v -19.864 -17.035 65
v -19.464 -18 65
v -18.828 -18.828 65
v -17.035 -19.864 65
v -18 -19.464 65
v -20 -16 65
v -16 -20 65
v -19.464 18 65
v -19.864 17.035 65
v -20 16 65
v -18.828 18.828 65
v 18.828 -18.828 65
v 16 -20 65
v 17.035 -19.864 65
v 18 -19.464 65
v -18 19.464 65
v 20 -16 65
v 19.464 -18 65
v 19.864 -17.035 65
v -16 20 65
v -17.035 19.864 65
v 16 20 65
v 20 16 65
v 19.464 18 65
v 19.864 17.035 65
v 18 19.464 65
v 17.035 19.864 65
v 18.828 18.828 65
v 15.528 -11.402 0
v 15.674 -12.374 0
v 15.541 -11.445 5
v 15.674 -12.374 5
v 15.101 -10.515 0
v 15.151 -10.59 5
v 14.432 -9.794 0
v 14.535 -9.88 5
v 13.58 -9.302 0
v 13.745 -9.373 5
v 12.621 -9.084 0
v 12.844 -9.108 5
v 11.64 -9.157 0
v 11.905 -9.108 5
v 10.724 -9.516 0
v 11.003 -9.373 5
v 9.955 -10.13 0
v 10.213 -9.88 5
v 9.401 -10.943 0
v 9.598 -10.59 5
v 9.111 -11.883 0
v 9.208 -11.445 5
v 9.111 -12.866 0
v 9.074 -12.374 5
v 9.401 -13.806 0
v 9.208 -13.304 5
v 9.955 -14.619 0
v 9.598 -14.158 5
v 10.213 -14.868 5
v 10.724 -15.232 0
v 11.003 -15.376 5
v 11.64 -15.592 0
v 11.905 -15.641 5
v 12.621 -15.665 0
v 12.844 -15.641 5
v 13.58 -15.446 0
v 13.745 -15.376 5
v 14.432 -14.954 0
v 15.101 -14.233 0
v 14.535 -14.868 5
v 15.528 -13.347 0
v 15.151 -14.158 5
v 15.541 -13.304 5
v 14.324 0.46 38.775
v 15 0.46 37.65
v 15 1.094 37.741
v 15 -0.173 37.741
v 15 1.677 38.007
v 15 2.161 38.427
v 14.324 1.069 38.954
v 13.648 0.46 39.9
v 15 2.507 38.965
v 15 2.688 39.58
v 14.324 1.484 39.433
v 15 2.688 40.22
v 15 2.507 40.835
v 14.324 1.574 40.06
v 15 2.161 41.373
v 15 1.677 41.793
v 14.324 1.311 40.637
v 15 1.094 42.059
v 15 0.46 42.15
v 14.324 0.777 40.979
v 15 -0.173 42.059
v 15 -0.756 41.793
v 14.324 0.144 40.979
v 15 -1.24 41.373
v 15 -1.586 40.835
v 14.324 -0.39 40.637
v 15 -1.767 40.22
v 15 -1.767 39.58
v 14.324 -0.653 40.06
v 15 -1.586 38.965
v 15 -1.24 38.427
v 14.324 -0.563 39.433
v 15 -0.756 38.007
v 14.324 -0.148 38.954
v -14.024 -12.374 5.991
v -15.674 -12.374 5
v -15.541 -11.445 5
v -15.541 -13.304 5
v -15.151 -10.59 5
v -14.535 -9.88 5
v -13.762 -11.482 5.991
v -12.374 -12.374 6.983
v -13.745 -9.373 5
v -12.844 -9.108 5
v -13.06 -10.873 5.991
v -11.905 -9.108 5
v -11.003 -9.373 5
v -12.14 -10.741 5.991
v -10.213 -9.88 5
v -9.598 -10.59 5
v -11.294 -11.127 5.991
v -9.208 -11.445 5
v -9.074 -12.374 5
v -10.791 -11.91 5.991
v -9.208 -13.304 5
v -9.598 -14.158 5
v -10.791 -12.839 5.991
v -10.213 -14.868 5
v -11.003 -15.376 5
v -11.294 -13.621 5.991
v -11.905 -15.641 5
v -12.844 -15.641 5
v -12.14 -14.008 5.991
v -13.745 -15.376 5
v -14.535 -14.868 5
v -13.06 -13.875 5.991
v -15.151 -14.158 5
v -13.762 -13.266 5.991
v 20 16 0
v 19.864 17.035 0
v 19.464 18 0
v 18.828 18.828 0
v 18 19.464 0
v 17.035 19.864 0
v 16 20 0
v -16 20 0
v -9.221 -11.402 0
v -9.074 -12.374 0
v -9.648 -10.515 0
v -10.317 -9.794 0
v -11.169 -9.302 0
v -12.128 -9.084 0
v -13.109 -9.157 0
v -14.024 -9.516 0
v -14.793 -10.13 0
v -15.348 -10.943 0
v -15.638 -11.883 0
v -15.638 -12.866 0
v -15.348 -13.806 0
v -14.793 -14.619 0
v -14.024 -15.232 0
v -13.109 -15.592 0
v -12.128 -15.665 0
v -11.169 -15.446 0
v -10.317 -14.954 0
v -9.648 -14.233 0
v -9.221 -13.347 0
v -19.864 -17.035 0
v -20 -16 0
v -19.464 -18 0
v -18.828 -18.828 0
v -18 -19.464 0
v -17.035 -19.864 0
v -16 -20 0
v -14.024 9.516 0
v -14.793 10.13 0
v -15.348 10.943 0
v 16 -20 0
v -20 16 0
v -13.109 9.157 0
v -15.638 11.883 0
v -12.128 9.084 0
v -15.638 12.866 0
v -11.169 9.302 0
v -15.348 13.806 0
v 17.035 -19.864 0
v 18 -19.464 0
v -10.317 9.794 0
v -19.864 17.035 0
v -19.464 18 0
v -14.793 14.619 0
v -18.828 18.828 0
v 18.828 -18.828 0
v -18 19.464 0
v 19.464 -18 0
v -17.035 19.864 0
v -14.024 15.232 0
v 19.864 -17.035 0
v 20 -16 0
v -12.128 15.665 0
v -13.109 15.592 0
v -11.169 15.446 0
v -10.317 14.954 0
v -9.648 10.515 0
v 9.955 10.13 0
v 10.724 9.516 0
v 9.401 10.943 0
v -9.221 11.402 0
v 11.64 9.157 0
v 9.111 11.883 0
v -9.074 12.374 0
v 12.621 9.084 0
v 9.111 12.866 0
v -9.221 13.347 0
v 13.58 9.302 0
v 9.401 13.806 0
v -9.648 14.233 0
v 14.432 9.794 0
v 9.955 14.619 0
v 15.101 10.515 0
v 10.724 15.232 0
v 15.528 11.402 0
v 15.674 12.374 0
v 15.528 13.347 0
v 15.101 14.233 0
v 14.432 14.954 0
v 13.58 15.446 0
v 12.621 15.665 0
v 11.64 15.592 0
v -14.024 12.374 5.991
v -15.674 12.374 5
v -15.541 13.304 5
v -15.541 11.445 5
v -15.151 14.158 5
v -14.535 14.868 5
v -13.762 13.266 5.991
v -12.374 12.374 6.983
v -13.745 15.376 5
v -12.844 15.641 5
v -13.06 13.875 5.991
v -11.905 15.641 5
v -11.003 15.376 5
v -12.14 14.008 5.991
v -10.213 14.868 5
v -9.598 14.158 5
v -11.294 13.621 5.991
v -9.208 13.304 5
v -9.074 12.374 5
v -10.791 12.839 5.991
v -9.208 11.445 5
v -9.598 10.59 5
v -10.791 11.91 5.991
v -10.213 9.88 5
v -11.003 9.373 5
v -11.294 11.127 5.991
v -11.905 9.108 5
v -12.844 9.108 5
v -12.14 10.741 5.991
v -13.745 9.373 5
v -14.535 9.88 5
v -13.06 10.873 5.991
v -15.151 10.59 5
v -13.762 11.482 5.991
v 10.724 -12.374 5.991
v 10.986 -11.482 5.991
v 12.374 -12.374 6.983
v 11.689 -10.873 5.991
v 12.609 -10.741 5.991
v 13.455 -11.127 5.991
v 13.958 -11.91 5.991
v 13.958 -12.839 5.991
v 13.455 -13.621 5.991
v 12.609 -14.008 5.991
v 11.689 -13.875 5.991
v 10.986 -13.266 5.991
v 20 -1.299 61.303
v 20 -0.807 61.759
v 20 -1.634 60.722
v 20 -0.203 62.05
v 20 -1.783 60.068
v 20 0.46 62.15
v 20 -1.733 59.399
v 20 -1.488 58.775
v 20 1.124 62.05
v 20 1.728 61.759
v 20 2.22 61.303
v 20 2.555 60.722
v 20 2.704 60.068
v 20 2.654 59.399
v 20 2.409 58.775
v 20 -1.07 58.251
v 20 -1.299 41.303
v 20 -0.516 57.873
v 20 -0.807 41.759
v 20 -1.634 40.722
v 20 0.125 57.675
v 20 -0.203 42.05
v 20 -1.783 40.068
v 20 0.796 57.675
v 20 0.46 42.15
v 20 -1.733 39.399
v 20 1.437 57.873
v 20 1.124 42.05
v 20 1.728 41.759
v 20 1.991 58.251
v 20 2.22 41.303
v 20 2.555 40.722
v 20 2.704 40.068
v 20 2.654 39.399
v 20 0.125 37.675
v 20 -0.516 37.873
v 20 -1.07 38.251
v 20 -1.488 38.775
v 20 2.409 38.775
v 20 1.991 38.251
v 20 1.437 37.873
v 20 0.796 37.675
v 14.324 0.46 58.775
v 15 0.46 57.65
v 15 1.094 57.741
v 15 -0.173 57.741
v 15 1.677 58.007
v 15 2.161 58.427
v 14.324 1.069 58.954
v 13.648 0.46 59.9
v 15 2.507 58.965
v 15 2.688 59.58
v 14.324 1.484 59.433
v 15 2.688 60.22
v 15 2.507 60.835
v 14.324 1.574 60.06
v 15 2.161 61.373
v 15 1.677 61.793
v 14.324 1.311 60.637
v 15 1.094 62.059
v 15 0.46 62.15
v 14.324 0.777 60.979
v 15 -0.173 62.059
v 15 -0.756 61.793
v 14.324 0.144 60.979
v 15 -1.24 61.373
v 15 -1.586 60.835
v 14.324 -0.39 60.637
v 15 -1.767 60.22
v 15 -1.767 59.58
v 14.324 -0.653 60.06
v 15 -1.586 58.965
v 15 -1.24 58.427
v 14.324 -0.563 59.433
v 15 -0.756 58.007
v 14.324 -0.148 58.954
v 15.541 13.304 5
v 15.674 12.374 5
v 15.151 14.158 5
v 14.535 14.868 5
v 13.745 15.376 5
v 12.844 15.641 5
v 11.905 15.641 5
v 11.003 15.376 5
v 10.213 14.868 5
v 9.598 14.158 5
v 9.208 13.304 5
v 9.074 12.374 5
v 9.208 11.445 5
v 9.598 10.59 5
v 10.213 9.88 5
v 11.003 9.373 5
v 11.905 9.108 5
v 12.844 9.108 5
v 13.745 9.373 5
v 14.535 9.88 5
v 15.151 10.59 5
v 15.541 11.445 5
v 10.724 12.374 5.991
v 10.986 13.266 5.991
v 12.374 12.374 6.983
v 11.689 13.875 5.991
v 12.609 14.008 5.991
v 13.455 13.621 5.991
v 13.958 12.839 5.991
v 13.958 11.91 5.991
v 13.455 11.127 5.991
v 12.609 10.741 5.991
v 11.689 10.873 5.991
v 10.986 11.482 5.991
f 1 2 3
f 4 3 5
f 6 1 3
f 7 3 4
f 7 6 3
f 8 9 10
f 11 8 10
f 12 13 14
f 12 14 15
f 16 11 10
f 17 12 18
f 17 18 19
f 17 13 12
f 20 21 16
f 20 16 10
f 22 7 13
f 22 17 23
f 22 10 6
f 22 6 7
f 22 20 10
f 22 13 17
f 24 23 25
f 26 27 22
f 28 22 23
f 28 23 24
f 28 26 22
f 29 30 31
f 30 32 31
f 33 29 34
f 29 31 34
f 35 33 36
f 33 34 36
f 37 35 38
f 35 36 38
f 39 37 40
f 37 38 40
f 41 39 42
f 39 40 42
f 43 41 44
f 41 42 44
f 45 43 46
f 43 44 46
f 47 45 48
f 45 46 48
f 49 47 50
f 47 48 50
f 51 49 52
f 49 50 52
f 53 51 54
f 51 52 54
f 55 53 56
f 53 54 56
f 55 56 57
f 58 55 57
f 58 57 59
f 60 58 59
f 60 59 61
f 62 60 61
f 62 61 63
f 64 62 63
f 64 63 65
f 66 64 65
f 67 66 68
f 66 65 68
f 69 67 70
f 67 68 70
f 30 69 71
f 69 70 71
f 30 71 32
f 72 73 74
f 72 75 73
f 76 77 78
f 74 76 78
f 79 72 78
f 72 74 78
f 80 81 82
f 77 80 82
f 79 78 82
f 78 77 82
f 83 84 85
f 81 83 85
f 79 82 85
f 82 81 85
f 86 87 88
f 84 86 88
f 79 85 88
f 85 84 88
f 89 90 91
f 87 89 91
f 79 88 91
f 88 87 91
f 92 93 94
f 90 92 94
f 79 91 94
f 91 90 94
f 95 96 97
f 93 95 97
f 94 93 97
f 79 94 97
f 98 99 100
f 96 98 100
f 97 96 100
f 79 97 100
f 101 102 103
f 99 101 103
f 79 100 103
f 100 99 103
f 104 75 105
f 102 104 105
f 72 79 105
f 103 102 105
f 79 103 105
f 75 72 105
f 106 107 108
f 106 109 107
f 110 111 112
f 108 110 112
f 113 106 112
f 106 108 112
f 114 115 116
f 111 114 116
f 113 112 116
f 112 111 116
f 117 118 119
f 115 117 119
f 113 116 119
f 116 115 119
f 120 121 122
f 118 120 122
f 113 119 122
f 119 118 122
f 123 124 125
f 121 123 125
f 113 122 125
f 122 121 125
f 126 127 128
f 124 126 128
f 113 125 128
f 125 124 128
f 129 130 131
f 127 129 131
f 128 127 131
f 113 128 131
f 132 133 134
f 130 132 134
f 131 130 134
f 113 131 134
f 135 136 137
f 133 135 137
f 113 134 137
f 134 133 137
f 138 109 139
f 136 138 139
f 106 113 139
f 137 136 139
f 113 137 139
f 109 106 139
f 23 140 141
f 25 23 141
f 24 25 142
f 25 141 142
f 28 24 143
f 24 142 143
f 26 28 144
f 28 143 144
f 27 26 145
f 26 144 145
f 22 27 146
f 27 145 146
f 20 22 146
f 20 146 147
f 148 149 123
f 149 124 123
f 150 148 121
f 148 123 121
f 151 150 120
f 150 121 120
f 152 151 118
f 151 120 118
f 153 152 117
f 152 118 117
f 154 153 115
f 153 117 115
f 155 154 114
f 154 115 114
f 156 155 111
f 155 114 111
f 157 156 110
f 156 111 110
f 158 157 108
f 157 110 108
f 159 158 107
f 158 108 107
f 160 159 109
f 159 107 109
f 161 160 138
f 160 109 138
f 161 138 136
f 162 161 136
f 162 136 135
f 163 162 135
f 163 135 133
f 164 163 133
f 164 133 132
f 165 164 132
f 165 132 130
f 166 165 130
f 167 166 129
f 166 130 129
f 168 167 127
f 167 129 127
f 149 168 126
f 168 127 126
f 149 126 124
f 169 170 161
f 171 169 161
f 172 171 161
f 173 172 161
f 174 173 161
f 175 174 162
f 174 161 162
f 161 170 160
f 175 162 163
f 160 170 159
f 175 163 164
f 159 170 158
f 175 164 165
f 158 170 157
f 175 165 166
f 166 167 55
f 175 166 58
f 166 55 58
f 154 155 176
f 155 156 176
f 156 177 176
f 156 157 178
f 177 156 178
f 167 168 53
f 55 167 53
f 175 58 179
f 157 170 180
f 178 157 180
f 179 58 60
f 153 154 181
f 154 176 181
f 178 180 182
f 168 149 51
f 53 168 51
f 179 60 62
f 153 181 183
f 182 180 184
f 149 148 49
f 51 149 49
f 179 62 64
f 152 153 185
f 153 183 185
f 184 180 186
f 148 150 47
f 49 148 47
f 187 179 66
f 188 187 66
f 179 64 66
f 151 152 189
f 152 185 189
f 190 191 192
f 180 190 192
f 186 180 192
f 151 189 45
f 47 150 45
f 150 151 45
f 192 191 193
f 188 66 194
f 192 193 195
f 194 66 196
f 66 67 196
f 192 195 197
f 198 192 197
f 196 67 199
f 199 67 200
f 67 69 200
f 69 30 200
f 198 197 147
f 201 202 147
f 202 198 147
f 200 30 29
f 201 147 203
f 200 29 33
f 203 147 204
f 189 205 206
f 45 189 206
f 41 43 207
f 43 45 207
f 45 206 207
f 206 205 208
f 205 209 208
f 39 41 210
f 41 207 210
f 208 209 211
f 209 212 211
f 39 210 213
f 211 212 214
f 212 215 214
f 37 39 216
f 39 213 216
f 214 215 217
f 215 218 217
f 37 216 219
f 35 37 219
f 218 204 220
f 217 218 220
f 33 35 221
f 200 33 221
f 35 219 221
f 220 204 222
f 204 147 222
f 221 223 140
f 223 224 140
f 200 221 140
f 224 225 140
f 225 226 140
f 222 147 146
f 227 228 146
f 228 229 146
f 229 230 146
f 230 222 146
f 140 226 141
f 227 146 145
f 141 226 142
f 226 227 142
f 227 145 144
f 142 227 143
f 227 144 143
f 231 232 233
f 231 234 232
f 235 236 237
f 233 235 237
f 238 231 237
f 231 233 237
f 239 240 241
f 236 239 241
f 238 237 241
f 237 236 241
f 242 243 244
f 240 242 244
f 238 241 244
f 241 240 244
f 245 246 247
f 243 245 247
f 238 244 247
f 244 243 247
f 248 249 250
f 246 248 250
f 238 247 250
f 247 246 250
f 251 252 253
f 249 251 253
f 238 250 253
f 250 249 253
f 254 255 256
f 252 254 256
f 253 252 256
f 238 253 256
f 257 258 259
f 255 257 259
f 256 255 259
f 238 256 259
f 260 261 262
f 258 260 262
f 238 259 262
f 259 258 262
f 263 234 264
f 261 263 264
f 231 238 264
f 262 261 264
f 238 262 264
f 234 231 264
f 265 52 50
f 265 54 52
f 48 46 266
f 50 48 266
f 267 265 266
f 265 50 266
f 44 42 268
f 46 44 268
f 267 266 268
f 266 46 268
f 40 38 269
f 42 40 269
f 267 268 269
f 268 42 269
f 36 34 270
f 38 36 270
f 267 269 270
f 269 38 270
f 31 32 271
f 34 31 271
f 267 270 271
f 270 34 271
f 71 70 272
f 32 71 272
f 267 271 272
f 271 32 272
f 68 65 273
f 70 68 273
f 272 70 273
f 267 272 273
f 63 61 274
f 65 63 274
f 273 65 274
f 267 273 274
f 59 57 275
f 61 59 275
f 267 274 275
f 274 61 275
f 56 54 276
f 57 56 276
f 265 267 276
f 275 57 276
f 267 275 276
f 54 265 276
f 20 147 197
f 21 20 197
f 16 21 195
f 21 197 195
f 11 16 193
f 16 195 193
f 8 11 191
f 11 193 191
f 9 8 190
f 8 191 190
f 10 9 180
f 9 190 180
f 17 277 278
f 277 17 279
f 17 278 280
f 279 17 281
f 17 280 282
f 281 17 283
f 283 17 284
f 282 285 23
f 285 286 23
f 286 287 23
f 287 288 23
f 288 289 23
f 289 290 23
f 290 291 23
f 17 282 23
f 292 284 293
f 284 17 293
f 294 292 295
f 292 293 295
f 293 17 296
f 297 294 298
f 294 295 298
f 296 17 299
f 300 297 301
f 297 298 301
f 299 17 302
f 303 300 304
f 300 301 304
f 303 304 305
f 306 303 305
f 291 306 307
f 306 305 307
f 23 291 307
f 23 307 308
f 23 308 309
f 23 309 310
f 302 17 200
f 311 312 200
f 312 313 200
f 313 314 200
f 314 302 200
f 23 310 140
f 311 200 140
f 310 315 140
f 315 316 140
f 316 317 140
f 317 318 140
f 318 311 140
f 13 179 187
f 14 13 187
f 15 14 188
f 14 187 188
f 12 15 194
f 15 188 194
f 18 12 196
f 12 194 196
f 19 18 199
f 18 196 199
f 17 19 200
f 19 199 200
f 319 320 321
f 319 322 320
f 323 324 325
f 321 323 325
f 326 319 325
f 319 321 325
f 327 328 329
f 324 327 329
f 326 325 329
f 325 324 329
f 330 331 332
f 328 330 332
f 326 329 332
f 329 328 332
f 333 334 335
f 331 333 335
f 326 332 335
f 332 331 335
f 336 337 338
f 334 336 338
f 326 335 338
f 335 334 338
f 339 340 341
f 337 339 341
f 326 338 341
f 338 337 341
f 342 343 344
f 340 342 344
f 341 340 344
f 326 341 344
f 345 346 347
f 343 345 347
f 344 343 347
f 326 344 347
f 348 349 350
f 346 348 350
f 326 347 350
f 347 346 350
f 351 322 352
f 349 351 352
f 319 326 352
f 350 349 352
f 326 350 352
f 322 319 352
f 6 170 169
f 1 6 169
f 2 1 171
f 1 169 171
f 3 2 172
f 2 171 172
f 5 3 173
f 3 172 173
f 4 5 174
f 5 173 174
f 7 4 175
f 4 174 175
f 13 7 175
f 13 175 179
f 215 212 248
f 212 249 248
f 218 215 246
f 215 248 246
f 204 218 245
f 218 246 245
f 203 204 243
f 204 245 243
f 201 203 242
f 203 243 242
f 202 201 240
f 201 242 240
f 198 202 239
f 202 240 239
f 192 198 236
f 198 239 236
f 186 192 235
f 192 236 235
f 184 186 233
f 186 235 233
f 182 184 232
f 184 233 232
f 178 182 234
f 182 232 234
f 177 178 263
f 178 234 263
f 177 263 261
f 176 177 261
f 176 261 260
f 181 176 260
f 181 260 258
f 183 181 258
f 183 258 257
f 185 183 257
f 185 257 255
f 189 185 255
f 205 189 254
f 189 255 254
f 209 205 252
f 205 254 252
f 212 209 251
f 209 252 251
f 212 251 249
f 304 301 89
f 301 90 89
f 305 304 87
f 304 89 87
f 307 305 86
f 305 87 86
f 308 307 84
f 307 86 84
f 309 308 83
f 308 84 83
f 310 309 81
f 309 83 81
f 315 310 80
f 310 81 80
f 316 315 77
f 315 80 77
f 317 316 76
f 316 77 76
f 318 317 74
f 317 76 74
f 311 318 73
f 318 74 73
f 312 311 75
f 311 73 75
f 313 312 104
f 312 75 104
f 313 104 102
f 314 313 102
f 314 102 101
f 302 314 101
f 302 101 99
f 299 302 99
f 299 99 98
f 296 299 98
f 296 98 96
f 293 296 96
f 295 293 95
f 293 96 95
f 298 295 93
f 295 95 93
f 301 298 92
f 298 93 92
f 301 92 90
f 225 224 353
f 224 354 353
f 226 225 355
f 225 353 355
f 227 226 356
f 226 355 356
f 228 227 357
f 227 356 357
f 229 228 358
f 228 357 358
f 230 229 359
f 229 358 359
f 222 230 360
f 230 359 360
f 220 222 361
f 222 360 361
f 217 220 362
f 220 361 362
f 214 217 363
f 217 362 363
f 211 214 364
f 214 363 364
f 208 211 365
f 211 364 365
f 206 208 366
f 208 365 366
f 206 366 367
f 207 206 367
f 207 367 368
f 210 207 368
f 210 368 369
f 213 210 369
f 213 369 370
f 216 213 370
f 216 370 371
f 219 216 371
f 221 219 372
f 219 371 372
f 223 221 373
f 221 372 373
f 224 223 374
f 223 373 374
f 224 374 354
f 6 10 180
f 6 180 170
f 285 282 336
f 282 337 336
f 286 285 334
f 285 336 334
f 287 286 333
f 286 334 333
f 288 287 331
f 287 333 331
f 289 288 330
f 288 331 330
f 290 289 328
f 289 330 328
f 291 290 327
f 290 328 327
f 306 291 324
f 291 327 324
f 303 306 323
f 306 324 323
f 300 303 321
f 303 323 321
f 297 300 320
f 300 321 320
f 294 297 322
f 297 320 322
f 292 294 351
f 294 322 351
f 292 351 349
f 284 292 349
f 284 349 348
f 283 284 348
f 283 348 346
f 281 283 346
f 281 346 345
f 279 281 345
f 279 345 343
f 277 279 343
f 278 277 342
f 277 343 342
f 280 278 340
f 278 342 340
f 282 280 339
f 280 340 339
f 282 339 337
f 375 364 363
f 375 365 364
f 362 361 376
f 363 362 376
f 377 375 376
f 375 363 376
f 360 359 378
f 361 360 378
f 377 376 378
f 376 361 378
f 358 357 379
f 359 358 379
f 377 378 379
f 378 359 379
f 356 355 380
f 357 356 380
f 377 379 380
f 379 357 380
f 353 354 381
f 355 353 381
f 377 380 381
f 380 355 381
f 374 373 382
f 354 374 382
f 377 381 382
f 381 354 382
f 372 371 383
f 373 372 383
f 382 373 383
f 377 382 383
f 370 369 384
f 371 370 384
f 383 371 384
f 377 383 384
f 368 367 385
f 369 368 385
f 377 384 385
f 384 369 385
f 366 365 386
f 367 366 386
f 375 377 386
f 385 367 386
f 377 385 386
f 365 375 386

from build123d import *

# Parameters (mm, degrees)
BOSS_EXTRUDE1_DEPTH      = 65
SKETCH2_R                = 0.512371799
CUT_EXTRUDE1_DEPTH       = 3
M6_CLEARANCE_HOLE1_D     = 6.6
M6_CLEARANCE_HOLE1_DEPTH = 5
M6_CLEARANCE_HOLE1_TIP   = 1.982840043
M4_CLEARANCE_HOLE1_D     = 4.5
M4_CLEARANCE_HOLE1_DEPTH = 5
M4_CLEARANCE_HOLE1_TIP   = 1.351936393


with BuildPart() as part:
    # Sketch1 → Boss-Extrude1 (new body)
    with BuildSketch(Plane.XY):
        with BuildLine():
            Line((-16, -20), (16, -20))
            ThreePointArc((16, -20), (18.828427125, -18.828427125), (20, -16))
            Line((20, -16), (20, 16))
            ThreePointArc((20, 16), (18.828427125, 18.828427125), (16, 20))
            Line((16, 20), (-16, 20))
            ThreePointArc((-16, 20), (-18.828427125, 18.828427125), (-20, 16))
            Line((-20, 16), (-20, -16))
            ThreePointArc((-20, -16), (-18.828427125, -18.828427125), (-16, -20))
        make_face()
    extrude(amount=BOSS_EXTRUDE1_DEPTH)

    # Sketch2 → Cut-Extrude1 (cut)
    with BuildSketch(Plane(origin=(0, 0, 0), x_dir=(-1, 0, 0), z_dir=(0, 0, -1))):
        with Locations((-12.374368671, 12.374368671)):
            Circle(SKETCH2_R)
        with Locations((12.374368671, 12.374368671)):
            Circle(SKETCH2_R)
        with Locations((12.374368671, -12.374368671)):
            Circle(SKETCH2_R)
        with Locations((-12.374368671, -12.374368671)):
            Circle(SKETCH2_R)
    extrude(amount=-CUT_EXTRUDE1_DEPTH, mode=Mode.SUBTRACT)

    # M6 Clearance Hole1
    with Locations(Plane(origin=(0, 0, 0), x_dir=(-1, 0, 0), z_dir=(0, 0, -1))):
        with Locations((12.374368671, 12.374368671), (-12.374368671, 12.374368671), (-12.374368671, -12.374368671), (12.374368671, -12.374368671)):
            Hole(M6_CLEARANCE_HOLE1_D / 2, depth=M6_CLEARANCE_HOLE1_DEPTH)
            with Locations((0, 0, -(M6_CLEARANCE_HOLE1_DEPTH + M6_CLEARANCE_HOLE1_TIP / 2))):  # 118° drill point
                Cone(0, M6_CLEARANCE_HOLE1_D / 2, M6_CLEARANCE_HOLE1_TIP, mode=Mode.SUBTRACT)

    # M4 Clearance Hole1
    with Locations(Plane(origin=(20, 0, 0), x_dir=(0, 0, -1), z_dir=(1, 0, 0))):
        with Locations((-59.899999999, 0.460499028), (-39.899999999, 0.460499028)):
            Hole(M4_CLEARANCE_HOLE1_D / 2, depth=M4_CLEARANCE_HOLE1_DEPTH)
            with Locations((0, 0, -(M4_CLEARANCE_HOLE1_DEPTH + M4_CLEARANCE_HOLE1_TIP / 2))):  # 118° drill point
                Cone(0, M4_CLEARANCE_HOLE1_D / 2, M4_CLEARANCE_HOLE1_TIP, mode=Mode.SUBTRACT)


solid = part.part
